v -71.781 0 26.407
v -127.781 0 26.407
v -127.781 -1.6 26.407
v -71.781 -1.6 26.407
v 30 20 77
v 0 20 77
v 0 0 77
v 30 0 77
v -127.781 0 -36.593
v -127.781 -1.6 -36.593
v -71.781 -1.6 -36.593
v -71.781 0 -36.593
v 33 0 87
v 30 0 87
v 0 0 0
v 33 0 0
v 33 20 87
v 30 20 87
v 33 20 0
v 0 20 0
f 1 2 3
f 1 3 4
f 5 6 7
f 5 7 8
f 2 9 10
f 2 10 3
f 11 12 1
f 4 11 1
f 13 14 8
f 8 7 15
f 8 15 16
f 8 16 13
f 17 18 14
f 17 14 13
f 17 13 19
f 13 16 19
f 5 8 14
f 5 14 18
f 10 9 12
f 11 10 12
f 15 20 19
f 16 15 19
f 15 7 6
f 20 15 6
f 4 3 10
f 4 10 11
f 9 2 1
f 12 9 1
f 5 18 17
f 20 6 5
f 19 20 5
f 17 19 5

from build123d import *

# Parameters (mm, degrees)
F0_W     = 56
F0_H     = 63
F1_DEPTH = 1.6
F2_W     = 33
F2_H     = 20
F3_DEPTH = 77
F4_W     = 3
F4_H     = 20
F5_DEPTH = 10


with BuildPart() as f1:
    # F0 (on Front) → F1 (new body)
    with BuildSketch(Plane.XZ):
        with Locations((-99.781469, -5.092814)):
            Rectangle(F0_W, F0_H)
    extrude(amount=F1_DEPTH)


with BuildPart() as f3:
    # F2 (on Top) → F3 (new body)
    with BuildSketch(Plane.XY):
        with Locations((16.5, 10)):
            Rectangle(F2_W, F2_H)
    extrude(amount=F3_DEPTH)

    # F4 (on face) → F5 (join)
    with BuildSketch(Plane.XY.offset(77)):
        with Locations((31.5, 10)):
            Rectangle(F4_W, F4_H)
    extrude(amount=F5_DEPTH)


solid = Compound([f1.part, f3.part])
